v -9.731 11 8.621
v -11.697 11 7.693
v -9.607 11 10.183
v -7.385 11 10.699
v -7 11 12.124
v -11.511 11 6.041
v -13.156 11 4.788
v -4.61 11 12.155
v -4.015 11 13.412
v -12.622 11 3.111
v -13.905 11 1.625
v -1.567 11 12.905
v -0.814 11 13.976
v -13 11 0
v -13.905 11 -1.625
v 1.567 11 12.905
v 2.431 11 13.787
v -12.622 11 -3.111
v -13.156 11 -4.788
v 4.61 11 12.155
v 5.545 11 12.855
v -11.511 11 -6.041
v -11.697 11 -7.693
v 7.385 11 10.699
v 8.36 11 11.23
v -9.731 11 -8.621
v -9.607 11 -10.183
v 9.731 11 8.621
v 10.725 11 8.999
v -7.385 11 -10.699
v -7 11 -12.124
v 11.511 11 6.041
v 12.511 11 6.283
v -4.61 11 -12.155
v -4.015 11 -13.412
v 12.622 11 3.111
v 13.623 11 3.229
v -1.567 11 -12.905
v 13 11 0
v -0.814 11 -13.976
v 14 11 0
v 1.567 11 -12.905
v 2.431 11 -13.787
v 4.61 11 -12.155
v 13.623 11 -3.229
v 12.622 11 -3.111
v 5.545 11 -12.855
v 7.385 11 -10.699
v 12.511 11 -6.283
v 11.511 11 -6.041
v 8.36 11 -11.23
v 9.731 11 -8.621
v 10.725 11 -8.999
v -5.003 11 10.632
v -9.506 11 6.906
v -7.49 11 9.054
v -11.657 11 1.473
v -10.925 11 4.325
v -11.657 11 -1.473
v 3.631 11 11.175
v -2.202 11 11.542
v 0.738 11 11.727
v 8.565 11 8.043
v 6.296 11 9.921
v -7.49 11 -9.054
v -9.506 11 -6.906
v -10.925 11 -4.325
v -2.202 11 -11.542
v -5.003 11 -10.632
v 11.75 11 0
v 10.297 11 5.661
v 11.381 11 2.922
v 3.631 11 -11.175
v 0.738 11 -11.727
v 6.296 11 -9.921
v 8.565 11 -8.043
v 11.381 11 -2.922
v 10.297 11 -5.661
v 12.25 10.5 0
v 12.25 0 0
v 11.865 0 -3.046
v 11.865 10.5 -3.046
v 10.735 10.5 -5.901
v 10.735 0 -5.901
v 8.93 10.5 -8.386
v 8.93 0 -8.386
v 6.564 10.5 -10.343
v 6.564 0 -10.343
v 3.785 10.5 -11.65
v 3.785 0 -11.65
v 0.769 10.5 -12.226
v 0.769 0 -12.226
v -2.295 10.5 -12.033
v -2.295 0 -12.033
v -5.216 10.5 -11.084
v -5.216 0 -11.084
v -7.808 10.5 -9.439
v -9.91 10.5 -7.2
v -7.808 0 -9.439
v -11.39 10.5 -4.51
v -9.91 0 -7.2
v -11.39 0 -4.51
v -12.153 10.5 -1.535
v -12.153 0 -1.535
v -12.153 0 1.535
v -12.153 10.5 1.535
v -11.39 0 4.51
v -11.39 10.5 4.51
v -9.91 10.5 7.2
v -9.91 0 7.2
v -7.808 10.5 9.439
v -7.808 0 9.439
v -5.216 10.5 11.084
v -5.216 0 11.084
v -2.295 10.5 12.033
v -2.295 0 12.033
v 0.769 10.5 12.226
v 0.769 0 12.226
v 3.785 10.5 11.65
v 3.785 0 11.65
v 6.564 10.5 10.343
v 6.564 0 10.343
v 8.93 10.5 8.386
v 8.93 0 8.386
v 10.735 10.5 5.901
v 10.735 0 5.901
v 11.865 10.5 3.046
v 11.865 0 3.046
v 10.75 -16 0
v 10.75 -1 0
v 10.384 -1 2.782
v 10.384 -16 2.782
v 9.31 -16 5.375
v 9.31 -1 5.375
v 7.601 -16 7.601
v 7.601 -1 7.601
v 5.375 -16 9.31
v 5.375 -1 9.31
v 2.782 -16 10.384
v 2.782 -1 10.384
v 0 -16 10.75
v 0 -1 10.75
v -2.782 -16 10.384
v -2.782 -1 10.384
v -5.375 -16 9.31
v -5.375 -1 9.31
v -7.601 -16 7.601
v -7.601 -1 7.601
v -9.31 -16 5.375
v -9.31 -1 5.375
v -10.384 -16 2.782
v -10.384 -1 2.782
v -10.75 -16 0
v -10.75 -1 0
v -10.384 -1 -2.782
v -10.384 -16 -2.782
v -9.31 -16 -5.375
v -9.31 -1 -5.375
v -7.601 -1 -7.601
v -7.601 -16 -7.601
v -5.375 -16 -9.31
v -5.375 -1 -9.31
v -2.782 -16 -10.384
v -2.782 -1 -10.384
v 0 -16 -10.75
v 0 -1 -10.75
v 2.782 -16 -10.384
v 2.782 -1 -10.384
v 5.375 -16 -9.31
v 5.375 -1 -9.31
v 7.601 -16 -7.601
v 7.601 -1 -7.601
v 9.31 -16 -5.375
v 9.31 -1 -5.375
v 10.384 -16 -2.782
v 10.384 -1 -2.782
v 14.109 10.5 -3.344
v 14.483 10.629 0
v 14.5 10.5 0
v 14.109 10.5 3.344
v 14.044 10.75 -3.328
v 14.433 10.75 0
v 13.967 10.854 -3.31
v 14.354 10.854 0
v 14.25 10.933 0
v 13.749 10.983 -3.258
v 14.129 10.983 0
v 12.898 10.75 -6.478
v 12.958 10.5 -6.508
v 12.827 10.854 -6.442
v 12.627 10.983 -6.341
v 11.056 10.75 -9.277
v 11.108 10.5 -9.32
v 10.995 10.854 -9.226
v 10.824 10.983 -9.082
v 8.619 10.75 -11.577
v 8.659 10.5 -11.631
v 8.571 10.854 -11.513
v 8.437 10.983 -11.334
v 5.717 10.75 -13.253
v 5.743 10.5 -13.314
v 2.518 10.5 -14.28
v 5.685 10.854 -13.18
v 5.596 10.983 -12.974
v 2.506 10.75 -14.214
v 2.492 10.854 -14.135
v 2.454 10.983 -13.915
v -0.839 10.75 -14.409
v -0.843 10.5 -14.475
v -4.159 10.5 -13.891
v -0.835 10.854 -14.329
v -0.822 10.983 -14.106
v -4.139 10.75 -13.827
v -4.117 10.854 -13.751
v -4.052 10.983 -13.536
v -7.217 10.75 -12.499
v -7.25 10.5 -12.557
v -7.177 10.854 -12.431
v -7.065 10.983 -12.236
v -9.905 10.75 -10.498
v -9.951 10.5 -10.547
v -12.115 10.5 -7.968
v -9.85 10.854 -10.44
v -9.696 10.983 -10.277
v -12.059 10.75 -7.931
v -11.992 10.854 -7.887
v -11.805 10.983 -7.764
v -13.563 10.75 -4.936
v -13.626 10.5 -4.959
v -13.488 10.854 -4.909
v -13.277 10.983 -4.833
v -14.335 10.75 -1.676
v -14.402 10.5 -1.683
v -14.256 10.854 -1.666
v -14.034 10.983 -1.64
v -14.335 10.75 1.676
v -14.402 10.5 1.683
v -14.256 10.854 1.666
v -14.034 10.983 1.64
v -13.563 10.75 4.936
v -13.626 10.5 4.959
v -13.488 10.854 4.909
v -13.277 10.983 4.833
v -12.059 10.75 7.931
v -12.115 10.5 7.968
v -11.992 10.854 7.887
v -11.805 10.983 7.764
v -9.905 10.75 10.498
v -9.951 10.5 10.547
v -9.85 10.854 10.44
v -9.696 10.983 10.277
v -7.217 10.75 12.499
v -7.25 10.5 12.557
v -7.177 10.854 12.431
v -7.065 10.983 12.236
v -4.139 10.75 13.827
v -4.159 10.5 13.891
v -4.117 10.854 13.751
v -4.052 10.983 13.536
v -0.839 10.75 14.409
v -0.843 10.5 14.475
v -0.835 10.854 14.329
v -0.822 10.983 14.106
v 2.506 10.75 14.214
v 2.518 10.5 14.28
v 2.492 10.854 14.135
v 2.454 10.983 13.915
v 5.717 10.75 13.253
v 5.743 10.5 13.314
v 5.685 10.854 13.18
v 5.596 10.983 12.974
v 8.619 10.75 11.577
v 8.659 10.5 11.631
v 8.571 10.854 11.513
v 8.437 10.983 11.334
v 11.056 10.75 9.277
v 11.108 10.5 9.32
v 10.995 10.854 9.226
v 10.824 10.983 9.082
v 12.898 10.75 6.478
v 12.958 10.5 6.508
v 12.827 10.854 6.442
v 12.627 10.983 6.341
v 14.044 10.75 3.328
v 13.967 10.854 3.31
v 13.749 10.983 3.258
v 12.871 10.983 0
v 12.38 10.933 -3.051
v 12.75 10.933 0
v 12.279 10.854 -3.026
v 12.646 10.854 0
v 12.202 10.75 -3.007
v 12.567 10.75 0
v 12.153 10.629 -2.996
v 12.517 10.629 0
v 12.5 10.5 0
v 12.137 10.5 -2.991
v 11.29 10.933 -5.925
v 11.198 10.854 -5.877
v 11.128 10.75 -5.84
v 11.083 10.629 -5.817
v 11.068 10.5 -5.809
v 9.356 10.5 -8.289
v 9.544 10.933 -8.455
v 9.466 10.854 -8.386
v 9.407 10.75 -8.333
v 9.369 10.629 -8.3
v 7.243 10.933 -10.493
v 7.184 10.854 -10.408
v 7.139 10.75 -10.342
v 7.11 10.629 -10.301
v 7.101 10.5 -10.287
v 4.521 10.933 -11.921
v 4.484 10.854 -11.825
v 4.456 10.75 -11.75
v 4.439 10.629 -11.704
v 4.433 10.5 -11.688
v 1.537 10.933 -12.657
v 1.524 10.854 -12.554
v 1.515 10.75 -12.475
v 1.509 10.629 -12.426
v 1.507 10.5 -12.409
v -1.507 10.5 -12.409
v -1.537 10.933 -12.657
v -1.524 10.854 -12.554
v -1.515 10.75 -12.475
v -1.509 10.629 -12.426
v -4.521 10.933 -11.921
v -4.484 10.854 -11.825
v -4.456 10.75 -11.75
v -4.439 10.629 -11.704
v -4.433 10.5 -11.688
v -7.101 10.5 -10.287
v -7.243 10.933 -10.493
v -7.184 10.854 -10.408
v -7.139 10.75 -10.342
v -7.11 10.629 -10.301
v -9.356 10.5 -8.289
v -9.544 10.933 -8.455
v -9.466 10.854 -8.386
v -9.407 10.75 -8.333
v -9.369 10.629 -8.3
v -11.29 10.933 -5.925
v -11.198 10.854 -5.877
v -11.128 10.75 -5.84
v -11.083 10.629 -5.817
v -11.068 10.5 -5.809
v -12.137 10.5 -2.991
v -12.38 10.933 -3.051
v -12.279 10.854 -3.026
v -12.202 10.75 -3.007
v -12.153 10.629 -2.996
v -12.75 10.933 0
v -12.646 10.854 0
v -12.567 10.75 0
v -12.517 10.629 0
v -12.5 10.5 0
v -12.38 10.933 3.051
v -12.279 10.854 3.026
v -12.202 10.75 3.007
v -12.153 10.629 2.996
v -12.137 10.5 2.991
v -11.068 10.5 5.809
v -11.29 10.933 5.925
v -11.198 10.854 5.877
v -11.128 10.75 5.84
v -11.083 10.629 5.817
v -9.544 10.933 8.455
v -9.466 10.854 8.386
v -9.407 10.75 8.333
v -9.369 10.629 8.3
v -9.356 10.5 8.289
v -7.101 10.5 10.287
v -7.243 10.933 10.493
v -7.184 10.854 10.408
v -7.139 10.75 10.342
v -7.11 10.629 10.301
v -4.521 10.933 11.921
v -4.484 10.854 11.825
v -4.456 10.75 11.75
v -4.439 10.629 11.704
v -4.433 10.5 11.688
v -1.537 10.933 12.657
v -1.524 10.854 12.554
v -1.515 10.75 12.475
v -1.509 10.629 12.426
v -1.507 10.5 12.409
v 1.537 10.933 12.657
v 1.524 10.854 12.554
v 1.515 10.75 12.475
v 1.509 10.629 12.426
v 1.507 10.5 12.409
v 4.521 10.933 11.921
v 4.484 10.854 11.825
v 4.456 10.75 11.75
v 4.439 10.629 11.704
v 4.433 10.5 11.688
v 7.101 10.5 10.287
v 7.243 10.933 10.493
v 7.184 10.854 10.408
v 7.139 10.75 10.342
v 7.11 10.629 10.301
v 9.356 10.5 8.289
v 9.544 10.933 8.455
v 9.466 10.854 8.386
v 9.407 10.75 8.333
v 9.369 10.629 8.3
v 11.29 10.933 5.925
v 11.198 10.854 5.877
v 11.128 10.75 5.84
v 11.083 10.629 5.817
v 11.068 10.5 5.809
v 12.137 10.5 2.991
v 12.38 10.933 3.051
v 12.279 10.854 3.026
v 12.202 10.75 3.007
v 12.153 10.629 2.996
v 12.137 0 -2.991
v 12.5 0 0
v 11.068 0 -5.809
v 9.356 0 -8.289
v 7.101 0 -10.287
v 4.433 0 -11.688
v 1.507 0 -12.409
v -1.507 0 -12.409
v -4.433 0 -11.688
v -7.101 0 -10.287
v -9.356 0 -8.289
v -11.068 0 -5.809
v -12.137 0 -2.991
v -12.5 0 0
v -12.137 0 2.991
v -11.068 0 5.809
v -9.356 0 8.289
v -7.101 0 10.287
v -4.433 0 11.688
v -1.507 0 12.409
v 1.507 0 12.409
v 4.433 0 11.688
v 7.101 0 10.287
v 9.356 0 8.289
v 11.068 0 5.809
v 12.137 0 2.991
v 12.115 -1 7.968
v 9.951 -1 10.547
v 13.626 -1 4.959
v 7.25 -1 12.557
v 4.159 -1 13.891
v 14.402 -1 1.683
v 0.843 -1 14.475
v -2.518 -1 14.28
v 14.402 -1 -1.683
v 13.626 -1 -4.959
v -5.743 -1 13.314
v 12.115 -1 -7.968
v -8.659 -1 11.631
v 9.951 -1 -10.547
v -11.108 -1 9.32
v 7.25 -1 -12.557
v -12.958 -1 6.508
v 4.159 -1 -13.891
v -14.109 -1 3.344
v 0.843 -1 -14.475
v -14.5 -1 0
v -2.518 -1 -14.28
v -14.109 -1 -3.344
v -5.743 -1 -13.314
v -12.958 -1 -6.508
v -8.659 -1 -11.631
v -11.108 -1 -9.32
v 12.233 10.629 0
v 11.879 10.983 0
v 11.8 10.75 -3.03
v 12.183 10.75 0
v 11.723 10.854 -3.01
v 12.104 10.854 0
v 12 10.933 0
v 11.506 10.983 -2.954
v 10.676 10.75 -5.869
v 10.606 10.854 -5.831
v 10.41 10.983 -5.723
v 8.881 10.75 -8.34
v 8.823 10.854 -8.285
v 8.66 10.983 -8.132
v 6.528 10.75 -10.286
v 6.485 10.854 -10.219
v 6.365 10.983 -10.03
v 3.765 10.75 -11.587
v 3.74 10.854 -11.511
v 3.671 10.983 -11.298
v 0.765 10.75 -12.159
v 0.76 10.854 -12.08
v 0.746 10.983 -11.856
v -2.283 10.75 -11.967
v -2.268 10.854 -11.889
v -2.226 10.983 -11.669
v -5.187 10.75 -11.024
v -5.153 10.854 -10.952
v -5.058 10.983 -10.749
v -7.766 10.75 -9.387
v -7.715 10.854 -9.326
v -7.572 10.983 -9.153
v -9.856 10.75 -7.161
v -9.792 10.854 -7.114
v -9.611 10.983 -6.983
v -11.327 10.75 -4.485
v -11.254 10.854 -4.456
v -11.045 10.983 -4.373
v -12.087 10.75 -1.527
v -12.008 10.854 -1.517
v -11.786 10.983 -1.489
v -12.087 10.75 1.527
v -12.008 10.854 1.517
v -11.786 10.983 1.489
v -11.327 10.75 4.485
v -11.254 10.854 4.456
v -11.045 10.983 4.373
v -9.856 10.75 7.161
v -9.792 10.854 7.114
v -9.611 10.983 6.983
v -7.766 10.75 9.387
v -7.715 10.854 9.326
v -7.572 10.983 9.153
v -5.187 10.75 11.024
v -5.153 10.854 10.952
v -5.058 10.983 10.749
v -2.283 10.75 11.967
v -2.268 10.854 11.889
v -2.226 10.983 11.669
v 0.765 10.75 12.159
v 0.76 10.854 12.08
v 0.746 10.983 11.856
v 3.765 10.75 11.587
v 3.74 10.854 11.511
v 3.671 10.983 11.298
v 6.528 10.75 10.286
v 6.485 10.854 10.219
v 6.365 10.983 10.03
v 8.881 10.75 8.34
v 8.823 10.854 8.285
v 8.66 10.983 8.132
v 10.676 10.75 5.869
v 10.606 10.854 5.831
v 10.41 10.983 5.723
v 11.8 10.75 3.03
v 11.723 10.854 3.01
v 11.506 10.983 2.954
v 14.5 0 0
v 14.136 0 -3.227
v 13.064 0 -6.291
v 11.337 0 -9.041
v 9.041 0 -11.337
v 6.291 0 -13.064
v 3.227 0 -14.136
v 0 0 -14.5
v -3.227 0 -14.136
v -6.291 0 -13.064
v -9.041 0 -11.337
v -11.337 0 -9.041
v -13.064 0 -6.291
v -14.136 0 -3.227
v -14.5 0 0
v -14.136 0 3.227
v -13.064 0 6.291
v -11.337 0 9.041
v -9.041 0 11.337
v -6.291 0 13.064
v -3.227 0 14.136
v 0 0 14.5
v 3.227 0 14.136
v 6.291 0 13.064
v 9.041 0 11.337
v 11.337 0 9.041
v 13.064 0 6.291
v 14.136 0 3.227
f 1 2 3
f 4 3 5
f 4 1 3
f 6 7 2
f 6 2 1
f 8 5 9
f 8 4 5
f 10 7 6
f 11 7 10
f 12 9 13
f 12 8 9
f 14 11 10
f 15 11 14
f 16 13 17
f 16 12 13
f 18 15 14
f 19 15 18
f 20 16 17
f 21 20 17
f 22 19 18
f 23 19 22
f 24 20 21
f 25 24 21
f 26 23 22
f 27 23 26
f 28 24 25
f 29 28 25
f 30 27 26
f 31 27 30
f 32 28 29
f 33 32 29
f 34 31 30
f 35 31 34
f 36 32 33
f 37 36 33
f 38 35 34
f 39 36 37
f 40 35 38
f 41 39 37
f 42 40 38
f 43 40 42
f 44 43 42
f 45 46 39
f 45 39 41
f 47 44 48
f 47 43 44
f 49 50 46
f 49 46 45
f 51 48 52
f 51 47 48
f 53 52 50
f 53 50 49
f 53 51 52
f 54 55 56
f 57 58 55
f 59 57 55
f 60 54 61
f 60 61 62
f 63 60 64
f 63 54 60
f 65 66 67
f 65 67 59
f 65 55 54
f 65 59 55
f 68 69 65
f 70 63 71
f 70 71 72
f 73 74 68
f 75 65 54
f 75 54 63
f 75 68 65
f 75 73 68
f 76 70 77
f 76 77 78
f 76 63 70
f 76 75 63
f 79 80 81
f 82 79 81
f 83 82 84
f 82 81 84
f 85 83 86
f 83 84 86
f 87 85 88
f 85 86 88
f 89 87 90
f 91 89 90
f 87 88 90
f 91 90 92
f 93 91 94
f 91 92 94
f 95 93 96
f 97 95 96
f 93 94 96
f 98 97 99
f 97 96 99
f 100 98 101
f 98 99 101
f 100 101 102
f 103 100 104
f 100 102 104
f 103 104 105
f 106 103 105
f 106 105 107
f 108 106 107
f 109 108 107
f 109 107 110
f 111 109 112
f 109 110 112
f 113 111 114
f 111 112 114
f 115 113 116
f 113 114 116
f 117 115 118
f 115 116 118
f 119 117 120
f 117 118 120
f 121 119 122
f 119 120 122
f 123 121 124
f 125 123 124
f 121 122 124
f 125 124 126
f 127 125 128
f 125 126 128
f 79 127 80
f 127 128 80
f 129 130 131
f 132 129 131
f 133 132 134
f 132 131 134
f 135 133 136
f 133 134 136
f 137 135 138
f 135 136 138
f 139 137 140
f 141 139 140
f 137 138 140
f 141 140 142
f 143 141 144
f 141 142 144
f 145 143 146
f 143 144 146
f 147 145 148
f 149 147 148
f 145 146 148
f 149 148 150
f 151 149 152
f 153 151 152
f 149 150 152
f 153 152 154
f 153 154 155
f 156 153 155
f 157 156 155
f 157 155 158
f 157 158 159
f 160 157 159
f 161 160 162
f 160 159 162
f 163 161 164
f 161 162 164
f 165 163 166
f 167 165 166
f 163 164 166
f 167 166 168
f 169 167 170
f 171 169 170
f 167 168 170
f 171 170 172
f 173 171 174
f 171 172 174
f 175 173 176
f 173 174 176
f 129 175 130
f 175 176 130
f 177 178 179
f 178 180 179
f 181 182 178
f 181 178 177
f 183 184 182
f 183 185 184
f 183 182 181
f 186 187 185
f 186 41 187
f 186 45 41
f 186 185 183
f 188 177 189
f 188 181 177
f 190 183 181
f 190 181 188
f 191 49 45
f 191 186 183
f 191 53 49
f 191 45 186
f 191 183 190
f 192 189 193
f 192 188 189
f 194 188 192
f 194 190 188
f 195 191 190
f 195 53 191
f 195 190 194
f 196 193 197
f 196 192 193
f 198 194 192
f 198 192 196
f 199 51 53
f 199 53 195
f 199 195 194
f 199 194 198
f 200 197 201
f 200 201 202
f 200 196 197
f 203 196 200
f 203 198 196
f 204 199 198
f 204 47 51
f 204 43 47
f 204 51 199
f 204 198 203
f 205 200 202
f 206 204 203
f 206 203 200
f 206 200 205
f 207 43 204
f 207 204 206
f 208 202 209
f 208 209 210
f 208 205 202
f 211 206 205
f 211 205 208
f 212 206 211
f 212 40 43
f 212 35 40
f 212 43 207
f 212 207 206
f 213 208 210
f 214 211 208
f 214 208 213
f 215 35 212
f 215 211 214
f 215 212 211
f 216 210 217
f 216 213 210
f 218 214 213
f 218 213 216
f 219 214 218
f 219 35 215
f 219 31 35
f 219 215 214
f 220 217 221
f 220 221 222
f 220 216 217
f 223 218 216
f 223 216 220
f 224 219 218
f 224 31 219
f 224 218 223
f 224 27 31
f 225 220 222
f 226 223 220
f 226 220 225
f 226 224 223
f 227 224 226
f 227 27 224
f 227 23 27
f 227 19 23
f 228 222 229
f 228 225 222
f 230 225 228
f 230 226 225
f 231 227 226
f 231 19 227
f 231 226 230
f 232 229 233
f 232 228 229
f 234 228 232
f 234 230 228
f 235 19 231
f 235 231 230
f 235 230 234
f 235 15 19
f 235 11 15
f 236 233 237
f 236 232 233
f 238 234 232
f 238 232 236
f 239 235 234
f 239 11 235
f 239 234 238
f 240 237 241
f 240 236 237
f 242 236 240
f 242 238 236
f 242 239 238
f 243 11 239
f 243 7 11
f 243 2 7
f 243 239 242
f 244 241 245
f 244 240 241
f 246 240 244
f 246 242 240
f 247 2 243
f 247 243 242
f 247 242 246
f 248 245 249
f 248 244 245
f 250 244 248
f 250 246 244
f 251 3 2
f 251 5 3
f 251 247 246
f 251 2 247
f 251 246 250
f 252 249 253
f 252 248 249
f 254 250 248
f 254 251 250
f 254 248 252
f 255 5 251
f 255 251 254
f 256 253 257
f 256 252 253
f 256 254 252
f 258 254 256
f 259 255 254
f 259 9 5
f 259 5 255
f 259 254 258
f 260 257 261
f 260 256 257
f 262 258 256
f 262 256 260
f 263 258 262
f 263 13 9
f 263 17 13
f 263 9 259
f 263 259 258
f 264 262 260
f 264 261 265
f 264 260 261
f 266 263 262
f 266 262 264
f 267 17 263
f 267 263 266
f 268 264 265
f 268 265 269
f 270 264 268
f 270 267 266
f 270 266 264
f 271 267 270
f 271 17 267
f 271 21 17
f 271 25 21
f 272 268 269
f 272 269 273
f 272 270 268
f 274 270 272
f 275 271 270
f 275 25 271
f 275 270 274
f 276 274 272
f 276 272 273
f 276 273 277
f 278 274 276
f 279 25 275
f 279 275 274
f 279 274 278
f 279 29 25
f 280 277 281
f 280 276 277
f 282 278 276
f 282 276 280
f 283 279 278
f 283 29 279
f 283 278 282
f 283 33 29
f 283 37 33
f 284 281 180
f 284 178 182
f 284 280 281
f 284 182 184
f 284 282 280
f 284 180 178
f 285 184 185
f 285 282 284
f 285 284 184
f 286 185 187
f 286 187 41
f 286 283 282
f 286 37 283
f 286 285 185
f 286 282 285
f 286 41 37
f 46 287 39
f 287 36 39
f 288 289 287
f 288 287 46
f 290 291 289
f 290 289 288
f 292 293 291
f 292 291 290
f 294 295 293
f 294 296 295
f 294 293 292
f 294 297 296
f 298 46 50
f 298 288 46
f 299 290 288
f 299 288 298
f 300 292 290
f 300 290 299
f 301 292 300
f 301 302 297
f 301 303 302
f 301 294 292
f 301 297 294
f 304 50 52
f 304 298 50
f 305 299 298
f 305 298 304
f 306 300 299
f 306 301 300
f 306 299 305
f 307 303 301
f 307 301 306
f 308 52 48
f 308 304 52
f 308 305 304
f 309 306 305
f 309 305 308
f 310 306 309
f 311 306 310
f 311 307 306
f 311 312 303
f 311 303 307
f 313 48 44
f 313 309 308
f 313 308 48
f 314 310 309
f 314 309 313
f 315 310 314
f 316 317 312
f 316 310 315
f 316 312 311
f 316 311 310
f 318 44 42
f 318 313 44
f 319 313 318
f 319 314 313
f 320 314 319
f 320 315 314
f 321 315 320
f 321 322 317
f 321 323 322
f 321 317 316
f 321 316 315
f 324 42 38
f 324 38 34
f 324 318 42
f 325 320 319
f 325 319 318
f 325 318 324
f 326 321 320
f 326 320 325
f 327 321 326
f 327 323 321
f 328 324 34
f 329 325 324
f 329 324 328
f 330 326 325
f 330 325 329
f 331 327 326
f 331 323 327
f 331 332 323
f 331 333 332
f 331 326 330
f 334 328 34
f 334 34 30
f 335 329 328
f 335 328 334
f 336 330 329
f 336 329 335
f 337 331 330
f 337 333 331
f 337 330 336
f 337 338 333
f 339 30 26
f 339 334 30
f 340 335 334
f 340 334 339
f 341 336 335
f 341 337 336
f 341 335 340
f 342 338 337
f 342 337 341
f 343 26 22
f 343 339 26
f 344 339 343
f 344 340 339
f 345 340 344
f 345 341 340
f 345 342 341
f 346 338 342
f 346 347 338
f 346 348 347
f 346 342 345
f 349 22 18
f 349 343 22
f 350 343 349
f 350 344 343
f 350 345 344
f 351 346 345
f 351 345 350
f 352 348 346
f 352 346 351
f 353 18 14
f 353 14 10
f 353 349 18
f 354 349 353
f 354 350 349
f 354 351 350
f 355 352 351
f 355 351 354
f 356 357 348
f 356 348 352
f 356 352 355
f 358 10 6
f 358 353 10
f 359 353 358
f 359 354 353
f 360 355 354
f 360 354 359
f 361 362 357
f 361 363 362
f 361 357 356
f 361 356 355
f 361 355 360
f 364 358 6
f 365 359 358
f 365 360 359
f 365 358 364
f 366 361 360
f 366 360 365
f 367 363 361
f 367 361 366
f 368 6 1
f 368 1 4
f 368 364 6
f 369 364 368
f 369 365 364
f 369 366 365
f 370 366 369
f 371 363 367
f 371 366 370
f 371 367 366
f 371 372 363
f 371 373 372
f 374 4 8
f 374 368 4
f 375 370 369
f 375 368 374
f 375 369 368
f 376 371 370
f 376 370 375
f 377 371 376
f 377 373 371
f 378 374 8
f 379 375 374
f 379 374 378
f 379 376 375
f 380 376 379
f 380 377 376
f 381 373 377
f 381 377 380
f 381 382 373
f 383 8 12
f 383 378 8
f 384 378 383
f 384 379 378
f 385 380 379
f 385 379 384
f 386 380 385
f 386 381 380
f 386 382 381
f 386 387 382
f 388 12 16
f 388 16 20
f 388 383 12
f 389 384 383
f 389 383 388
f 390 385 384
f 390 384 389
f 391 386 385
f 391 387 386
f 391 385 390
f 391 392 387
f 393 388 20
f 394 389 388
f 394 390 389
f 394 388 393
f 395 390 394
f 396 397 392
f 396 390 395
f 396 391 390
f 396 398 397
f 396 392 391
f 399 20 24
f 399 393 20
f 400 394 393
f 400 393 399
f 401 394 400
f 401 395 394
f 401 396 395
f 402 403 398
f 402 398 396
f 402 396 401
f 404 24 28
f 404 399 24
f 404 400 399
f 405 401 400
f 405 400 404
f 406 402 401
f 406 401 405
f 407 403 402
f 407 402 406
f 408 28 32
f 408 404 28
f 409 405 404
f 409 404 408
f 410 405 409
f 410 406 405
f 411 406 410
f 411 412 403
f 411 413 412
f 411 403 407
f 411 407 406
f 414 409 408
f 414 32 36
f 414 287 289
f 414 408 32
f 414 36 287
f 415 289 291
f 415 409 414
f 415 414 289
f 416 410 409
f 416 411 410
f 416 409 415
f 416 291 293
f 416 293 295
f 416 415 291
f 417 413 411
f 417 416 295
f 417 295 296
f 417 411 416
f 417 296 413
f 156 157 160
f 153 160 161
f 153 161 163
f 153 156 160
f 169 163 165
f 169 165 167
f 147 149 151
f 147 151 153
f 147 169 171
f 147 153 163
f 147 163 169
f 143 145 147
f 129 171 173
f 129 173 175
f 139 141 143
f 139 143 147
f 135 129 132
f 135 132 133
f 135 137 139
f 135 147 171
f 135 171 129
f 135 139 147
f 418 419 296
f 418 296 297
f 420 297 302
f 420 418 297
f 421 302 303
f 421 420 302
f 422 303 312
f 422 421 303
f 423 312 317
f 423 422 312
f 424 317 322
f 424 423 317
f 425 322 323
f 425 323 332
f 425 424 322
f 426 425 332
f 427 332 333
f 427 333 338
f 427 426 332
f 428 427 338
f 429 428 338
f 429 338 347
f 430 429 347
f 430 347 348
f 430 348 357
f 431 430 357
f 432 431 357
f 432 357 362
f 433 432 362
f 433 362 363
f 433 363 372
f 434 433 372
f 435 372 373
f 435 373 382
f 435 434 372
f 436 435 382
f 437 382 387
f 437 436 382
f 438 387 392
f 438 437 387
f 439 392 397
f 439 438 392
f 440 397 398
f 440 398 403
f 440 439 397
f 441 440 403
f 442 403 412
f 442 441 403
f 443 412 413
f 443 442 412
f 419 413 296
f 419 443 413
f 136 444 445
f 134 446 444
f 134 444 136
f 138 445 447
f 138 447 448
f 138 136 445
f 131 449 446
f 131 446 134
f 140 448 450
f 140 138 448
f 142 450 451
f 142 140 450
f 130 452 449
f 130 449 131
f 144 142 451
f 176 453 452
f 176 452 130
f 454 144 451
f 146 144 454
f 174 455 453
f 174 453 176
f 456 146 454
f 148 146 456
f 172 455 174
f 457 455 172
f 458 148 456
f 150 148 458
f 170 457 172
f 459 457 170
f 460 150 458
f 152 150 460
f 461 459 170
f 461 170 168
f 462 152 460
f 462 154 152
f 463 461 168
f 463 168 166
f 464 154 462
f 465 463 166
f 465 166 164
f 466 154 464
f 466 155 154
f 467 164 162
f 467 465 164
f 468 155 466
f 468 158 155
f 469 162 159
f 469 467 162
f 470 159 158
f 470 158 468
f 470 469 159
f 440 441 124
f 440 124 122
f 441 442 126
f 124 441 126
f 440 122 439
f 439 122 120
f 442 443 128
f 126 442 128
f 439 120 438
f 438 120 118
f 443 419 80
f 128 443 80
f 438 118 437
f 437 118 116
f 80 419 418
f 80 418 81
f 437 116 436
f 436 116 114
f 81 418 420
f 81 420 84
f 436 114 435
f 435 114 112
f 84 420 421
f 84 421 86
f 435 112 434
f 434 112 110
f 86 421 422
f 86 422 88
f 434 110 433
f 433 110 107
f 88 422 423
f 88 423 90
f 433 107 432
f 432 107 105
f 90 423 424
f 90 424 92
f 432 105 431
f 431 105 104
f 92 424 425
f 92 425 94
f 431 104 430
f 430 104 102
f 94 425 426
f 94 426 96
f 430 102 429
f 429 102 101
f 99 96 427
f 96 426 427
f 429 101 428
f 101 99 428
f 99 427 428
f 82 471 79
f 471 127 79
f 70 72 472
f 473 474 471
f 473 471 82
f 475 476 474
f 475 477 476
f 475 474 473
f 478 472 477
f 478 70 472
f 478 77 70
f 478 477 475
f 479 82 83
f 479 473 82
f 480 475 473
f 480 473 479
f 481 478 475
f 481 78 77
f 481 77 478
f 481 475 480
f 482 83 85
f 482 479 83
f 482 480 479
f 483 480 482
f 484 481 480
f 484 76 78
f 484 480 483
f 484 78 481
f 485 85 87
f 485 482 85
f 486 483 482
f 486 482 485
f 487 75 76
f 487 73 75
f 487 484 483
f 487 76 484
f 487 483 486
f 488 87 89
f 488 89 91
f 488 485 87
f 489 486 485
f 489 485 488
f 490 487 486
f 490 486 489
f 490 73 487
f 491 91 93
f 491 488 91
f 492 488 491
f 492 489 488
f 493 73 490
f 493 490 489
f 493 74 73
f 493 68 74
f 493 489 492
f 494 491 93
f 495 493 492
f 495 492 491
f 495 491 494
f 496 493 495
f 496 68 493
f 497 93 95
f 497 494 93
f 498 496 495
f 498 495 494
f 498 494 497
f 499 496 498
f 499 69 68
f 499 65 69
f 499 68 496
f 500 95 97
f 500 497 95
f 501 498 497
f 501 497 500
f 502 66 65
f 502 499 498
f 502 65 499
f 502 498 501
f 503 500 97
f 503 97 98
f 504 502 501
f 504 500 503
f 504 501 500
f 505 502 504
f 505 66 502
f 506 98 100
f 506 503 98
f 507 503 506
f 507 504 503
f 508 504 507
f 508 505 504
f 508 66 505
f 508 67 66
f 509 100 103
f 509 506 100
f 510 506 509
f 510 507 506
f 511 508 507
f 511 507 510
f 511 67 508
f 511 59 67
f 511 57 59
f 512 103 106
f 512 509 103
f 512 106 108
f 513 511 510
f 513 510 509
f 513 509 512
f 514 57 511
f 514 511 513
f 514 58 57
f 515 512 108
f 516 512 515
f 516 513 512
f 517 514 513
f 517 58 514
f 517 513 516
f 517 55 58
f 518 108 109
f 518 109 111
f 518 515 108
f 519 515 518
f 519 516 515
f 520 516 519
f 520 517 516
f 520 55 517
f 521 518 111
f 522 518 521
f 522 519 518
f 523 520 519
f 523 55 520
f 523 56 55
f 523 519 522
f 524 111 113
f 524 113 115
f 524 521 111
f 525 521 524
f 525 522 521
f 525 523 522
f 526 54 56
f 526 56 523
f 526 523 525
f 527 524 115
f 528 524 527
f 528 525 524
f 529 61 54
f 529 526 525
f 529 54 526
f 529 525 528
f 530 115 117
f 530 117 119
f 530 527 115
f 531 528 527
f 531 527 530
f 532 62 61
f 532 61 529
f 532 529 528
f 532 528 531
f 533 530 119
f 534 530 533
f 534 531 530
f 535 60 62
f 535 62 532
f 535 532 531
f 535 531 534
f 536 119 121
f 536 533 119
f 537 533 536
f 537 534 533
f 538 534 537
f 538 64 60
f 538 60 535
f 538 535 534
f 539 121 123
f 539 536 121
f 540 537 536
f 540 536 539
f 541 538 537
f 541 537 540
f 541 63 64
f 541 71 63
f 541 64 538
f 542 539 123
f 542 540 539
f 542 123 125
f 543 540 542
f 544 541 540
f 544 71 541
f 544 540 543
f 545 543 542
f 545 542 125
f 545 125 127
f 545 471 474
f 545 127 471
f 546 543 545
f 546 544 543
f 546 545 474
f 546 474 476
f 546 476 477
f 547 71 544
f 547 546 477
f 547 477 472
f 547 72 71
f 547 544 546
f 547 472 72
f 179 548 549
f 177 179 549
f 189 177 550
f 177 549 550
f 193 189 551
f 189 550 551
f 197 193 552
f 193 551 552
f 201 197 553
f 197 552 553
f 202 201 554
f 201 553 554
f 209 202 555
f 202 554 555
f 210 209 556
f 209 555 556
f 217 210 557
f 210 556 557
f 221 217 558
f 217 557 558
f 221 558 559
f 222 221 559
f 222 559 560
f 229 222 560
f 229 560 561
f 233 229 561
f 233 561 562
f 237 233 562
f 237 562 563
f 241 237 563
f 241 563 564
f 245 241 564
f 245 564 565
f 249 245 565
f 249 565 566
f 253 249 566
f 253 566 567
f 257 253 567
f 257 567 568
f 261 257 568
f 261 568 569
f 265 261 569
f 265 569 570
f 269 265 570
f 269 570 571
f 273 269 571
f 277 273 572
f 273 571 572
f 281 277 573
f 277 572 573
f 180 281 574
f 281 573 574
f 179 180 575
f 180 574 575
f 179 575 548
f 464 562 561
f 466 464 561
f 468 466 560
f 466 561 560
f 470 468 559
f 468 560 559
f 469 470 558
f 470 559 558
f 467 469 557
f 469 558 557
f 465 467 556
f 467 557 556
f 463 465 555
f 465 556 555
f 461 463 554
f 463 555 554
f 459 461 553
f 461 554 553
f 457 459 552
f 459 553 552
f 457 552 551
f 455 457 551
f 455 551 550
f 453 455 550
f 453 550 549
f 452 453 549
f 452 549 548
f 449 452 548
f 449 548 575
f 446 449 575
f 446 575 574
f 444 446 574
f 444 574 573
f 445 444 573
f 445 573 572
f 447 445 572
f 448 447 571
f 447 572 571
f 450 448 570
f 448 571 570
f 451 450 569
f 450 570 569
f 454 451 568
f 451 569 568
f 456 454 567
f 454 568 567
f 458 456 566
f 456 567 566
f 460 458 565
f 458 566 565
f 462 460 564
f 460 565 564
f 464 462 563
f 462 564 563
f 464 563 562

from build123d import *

# Parameters (mm, degrees)
SKETCH1_R           = 14.5
SKETCH1_R_2         = 12.5
BOSS_EXTRUDE1_DEPTH = 11
SKETCH2_R           = 14.5
BOSS_EXTRUDE2_DEPTH = 1
SKETCH3_R           = 10.75
BOSS_EXTRUDE3_DEPTH = 15
SKETCH4_R           = 12.25
BOSS_EXTRUDE4_DEPTH = 11
FILLET1_R           = 0.5


with BuildPart() as part:
    # Sketch1 → Boss-Extrude1 (new body)
    with BuildSketch(Plane(origin=(0, 0, 0), x_dir=(1, 0, 0), z_dir=(0, 1, 0))):
        Circle(SKETCH1_R)
        Circle(SKETCH1_R_2, mode=Mode.SUBTRACT)
    extrude(amount=BOSS_EXTRUDE1_DEPTH)

    # Sketch2 → Boss-Extrude2 (add)
    with BuildSketch(Plane(origin=(0, 0, 0), x_dir=(-1, 0, 0), z_dir=(0, -1, 0))):
        Circle(SKETCH2_R)
    extrude(amount=BOSS_EXTRUDE2_DEPTH)

    # Sketch3 → Boss-Extrude3 (add)
    with BuildSketch(Plane.XZ.offset(1)):
        Circle(SKETCH3_R)
    extrude(amount=BOSS_EXTRUDE3_DEPTH)

    # Sketch4 → Boss-Extrude4 (add)
    with BuildSketch(Plane(origin=(0, 0, 0), x_dir=(1, 0, 0), z_dir=(0, 1, 0))):
        Circle(SKETCH4_R)
    extrude(amount=BOSS_EXTRUDE4_DEPTH)

    # Fillet1
    fillet1_edges = [part.edges().sort_by_distance(p)[0] for p in [
        (-12.25, 11, 0),
        (-14.5, 11, 0),
        (-12.5, 11, 0),
    ]]
    fillet(fillet1_edges, radius=FILLET1_R)


solid = part.part
